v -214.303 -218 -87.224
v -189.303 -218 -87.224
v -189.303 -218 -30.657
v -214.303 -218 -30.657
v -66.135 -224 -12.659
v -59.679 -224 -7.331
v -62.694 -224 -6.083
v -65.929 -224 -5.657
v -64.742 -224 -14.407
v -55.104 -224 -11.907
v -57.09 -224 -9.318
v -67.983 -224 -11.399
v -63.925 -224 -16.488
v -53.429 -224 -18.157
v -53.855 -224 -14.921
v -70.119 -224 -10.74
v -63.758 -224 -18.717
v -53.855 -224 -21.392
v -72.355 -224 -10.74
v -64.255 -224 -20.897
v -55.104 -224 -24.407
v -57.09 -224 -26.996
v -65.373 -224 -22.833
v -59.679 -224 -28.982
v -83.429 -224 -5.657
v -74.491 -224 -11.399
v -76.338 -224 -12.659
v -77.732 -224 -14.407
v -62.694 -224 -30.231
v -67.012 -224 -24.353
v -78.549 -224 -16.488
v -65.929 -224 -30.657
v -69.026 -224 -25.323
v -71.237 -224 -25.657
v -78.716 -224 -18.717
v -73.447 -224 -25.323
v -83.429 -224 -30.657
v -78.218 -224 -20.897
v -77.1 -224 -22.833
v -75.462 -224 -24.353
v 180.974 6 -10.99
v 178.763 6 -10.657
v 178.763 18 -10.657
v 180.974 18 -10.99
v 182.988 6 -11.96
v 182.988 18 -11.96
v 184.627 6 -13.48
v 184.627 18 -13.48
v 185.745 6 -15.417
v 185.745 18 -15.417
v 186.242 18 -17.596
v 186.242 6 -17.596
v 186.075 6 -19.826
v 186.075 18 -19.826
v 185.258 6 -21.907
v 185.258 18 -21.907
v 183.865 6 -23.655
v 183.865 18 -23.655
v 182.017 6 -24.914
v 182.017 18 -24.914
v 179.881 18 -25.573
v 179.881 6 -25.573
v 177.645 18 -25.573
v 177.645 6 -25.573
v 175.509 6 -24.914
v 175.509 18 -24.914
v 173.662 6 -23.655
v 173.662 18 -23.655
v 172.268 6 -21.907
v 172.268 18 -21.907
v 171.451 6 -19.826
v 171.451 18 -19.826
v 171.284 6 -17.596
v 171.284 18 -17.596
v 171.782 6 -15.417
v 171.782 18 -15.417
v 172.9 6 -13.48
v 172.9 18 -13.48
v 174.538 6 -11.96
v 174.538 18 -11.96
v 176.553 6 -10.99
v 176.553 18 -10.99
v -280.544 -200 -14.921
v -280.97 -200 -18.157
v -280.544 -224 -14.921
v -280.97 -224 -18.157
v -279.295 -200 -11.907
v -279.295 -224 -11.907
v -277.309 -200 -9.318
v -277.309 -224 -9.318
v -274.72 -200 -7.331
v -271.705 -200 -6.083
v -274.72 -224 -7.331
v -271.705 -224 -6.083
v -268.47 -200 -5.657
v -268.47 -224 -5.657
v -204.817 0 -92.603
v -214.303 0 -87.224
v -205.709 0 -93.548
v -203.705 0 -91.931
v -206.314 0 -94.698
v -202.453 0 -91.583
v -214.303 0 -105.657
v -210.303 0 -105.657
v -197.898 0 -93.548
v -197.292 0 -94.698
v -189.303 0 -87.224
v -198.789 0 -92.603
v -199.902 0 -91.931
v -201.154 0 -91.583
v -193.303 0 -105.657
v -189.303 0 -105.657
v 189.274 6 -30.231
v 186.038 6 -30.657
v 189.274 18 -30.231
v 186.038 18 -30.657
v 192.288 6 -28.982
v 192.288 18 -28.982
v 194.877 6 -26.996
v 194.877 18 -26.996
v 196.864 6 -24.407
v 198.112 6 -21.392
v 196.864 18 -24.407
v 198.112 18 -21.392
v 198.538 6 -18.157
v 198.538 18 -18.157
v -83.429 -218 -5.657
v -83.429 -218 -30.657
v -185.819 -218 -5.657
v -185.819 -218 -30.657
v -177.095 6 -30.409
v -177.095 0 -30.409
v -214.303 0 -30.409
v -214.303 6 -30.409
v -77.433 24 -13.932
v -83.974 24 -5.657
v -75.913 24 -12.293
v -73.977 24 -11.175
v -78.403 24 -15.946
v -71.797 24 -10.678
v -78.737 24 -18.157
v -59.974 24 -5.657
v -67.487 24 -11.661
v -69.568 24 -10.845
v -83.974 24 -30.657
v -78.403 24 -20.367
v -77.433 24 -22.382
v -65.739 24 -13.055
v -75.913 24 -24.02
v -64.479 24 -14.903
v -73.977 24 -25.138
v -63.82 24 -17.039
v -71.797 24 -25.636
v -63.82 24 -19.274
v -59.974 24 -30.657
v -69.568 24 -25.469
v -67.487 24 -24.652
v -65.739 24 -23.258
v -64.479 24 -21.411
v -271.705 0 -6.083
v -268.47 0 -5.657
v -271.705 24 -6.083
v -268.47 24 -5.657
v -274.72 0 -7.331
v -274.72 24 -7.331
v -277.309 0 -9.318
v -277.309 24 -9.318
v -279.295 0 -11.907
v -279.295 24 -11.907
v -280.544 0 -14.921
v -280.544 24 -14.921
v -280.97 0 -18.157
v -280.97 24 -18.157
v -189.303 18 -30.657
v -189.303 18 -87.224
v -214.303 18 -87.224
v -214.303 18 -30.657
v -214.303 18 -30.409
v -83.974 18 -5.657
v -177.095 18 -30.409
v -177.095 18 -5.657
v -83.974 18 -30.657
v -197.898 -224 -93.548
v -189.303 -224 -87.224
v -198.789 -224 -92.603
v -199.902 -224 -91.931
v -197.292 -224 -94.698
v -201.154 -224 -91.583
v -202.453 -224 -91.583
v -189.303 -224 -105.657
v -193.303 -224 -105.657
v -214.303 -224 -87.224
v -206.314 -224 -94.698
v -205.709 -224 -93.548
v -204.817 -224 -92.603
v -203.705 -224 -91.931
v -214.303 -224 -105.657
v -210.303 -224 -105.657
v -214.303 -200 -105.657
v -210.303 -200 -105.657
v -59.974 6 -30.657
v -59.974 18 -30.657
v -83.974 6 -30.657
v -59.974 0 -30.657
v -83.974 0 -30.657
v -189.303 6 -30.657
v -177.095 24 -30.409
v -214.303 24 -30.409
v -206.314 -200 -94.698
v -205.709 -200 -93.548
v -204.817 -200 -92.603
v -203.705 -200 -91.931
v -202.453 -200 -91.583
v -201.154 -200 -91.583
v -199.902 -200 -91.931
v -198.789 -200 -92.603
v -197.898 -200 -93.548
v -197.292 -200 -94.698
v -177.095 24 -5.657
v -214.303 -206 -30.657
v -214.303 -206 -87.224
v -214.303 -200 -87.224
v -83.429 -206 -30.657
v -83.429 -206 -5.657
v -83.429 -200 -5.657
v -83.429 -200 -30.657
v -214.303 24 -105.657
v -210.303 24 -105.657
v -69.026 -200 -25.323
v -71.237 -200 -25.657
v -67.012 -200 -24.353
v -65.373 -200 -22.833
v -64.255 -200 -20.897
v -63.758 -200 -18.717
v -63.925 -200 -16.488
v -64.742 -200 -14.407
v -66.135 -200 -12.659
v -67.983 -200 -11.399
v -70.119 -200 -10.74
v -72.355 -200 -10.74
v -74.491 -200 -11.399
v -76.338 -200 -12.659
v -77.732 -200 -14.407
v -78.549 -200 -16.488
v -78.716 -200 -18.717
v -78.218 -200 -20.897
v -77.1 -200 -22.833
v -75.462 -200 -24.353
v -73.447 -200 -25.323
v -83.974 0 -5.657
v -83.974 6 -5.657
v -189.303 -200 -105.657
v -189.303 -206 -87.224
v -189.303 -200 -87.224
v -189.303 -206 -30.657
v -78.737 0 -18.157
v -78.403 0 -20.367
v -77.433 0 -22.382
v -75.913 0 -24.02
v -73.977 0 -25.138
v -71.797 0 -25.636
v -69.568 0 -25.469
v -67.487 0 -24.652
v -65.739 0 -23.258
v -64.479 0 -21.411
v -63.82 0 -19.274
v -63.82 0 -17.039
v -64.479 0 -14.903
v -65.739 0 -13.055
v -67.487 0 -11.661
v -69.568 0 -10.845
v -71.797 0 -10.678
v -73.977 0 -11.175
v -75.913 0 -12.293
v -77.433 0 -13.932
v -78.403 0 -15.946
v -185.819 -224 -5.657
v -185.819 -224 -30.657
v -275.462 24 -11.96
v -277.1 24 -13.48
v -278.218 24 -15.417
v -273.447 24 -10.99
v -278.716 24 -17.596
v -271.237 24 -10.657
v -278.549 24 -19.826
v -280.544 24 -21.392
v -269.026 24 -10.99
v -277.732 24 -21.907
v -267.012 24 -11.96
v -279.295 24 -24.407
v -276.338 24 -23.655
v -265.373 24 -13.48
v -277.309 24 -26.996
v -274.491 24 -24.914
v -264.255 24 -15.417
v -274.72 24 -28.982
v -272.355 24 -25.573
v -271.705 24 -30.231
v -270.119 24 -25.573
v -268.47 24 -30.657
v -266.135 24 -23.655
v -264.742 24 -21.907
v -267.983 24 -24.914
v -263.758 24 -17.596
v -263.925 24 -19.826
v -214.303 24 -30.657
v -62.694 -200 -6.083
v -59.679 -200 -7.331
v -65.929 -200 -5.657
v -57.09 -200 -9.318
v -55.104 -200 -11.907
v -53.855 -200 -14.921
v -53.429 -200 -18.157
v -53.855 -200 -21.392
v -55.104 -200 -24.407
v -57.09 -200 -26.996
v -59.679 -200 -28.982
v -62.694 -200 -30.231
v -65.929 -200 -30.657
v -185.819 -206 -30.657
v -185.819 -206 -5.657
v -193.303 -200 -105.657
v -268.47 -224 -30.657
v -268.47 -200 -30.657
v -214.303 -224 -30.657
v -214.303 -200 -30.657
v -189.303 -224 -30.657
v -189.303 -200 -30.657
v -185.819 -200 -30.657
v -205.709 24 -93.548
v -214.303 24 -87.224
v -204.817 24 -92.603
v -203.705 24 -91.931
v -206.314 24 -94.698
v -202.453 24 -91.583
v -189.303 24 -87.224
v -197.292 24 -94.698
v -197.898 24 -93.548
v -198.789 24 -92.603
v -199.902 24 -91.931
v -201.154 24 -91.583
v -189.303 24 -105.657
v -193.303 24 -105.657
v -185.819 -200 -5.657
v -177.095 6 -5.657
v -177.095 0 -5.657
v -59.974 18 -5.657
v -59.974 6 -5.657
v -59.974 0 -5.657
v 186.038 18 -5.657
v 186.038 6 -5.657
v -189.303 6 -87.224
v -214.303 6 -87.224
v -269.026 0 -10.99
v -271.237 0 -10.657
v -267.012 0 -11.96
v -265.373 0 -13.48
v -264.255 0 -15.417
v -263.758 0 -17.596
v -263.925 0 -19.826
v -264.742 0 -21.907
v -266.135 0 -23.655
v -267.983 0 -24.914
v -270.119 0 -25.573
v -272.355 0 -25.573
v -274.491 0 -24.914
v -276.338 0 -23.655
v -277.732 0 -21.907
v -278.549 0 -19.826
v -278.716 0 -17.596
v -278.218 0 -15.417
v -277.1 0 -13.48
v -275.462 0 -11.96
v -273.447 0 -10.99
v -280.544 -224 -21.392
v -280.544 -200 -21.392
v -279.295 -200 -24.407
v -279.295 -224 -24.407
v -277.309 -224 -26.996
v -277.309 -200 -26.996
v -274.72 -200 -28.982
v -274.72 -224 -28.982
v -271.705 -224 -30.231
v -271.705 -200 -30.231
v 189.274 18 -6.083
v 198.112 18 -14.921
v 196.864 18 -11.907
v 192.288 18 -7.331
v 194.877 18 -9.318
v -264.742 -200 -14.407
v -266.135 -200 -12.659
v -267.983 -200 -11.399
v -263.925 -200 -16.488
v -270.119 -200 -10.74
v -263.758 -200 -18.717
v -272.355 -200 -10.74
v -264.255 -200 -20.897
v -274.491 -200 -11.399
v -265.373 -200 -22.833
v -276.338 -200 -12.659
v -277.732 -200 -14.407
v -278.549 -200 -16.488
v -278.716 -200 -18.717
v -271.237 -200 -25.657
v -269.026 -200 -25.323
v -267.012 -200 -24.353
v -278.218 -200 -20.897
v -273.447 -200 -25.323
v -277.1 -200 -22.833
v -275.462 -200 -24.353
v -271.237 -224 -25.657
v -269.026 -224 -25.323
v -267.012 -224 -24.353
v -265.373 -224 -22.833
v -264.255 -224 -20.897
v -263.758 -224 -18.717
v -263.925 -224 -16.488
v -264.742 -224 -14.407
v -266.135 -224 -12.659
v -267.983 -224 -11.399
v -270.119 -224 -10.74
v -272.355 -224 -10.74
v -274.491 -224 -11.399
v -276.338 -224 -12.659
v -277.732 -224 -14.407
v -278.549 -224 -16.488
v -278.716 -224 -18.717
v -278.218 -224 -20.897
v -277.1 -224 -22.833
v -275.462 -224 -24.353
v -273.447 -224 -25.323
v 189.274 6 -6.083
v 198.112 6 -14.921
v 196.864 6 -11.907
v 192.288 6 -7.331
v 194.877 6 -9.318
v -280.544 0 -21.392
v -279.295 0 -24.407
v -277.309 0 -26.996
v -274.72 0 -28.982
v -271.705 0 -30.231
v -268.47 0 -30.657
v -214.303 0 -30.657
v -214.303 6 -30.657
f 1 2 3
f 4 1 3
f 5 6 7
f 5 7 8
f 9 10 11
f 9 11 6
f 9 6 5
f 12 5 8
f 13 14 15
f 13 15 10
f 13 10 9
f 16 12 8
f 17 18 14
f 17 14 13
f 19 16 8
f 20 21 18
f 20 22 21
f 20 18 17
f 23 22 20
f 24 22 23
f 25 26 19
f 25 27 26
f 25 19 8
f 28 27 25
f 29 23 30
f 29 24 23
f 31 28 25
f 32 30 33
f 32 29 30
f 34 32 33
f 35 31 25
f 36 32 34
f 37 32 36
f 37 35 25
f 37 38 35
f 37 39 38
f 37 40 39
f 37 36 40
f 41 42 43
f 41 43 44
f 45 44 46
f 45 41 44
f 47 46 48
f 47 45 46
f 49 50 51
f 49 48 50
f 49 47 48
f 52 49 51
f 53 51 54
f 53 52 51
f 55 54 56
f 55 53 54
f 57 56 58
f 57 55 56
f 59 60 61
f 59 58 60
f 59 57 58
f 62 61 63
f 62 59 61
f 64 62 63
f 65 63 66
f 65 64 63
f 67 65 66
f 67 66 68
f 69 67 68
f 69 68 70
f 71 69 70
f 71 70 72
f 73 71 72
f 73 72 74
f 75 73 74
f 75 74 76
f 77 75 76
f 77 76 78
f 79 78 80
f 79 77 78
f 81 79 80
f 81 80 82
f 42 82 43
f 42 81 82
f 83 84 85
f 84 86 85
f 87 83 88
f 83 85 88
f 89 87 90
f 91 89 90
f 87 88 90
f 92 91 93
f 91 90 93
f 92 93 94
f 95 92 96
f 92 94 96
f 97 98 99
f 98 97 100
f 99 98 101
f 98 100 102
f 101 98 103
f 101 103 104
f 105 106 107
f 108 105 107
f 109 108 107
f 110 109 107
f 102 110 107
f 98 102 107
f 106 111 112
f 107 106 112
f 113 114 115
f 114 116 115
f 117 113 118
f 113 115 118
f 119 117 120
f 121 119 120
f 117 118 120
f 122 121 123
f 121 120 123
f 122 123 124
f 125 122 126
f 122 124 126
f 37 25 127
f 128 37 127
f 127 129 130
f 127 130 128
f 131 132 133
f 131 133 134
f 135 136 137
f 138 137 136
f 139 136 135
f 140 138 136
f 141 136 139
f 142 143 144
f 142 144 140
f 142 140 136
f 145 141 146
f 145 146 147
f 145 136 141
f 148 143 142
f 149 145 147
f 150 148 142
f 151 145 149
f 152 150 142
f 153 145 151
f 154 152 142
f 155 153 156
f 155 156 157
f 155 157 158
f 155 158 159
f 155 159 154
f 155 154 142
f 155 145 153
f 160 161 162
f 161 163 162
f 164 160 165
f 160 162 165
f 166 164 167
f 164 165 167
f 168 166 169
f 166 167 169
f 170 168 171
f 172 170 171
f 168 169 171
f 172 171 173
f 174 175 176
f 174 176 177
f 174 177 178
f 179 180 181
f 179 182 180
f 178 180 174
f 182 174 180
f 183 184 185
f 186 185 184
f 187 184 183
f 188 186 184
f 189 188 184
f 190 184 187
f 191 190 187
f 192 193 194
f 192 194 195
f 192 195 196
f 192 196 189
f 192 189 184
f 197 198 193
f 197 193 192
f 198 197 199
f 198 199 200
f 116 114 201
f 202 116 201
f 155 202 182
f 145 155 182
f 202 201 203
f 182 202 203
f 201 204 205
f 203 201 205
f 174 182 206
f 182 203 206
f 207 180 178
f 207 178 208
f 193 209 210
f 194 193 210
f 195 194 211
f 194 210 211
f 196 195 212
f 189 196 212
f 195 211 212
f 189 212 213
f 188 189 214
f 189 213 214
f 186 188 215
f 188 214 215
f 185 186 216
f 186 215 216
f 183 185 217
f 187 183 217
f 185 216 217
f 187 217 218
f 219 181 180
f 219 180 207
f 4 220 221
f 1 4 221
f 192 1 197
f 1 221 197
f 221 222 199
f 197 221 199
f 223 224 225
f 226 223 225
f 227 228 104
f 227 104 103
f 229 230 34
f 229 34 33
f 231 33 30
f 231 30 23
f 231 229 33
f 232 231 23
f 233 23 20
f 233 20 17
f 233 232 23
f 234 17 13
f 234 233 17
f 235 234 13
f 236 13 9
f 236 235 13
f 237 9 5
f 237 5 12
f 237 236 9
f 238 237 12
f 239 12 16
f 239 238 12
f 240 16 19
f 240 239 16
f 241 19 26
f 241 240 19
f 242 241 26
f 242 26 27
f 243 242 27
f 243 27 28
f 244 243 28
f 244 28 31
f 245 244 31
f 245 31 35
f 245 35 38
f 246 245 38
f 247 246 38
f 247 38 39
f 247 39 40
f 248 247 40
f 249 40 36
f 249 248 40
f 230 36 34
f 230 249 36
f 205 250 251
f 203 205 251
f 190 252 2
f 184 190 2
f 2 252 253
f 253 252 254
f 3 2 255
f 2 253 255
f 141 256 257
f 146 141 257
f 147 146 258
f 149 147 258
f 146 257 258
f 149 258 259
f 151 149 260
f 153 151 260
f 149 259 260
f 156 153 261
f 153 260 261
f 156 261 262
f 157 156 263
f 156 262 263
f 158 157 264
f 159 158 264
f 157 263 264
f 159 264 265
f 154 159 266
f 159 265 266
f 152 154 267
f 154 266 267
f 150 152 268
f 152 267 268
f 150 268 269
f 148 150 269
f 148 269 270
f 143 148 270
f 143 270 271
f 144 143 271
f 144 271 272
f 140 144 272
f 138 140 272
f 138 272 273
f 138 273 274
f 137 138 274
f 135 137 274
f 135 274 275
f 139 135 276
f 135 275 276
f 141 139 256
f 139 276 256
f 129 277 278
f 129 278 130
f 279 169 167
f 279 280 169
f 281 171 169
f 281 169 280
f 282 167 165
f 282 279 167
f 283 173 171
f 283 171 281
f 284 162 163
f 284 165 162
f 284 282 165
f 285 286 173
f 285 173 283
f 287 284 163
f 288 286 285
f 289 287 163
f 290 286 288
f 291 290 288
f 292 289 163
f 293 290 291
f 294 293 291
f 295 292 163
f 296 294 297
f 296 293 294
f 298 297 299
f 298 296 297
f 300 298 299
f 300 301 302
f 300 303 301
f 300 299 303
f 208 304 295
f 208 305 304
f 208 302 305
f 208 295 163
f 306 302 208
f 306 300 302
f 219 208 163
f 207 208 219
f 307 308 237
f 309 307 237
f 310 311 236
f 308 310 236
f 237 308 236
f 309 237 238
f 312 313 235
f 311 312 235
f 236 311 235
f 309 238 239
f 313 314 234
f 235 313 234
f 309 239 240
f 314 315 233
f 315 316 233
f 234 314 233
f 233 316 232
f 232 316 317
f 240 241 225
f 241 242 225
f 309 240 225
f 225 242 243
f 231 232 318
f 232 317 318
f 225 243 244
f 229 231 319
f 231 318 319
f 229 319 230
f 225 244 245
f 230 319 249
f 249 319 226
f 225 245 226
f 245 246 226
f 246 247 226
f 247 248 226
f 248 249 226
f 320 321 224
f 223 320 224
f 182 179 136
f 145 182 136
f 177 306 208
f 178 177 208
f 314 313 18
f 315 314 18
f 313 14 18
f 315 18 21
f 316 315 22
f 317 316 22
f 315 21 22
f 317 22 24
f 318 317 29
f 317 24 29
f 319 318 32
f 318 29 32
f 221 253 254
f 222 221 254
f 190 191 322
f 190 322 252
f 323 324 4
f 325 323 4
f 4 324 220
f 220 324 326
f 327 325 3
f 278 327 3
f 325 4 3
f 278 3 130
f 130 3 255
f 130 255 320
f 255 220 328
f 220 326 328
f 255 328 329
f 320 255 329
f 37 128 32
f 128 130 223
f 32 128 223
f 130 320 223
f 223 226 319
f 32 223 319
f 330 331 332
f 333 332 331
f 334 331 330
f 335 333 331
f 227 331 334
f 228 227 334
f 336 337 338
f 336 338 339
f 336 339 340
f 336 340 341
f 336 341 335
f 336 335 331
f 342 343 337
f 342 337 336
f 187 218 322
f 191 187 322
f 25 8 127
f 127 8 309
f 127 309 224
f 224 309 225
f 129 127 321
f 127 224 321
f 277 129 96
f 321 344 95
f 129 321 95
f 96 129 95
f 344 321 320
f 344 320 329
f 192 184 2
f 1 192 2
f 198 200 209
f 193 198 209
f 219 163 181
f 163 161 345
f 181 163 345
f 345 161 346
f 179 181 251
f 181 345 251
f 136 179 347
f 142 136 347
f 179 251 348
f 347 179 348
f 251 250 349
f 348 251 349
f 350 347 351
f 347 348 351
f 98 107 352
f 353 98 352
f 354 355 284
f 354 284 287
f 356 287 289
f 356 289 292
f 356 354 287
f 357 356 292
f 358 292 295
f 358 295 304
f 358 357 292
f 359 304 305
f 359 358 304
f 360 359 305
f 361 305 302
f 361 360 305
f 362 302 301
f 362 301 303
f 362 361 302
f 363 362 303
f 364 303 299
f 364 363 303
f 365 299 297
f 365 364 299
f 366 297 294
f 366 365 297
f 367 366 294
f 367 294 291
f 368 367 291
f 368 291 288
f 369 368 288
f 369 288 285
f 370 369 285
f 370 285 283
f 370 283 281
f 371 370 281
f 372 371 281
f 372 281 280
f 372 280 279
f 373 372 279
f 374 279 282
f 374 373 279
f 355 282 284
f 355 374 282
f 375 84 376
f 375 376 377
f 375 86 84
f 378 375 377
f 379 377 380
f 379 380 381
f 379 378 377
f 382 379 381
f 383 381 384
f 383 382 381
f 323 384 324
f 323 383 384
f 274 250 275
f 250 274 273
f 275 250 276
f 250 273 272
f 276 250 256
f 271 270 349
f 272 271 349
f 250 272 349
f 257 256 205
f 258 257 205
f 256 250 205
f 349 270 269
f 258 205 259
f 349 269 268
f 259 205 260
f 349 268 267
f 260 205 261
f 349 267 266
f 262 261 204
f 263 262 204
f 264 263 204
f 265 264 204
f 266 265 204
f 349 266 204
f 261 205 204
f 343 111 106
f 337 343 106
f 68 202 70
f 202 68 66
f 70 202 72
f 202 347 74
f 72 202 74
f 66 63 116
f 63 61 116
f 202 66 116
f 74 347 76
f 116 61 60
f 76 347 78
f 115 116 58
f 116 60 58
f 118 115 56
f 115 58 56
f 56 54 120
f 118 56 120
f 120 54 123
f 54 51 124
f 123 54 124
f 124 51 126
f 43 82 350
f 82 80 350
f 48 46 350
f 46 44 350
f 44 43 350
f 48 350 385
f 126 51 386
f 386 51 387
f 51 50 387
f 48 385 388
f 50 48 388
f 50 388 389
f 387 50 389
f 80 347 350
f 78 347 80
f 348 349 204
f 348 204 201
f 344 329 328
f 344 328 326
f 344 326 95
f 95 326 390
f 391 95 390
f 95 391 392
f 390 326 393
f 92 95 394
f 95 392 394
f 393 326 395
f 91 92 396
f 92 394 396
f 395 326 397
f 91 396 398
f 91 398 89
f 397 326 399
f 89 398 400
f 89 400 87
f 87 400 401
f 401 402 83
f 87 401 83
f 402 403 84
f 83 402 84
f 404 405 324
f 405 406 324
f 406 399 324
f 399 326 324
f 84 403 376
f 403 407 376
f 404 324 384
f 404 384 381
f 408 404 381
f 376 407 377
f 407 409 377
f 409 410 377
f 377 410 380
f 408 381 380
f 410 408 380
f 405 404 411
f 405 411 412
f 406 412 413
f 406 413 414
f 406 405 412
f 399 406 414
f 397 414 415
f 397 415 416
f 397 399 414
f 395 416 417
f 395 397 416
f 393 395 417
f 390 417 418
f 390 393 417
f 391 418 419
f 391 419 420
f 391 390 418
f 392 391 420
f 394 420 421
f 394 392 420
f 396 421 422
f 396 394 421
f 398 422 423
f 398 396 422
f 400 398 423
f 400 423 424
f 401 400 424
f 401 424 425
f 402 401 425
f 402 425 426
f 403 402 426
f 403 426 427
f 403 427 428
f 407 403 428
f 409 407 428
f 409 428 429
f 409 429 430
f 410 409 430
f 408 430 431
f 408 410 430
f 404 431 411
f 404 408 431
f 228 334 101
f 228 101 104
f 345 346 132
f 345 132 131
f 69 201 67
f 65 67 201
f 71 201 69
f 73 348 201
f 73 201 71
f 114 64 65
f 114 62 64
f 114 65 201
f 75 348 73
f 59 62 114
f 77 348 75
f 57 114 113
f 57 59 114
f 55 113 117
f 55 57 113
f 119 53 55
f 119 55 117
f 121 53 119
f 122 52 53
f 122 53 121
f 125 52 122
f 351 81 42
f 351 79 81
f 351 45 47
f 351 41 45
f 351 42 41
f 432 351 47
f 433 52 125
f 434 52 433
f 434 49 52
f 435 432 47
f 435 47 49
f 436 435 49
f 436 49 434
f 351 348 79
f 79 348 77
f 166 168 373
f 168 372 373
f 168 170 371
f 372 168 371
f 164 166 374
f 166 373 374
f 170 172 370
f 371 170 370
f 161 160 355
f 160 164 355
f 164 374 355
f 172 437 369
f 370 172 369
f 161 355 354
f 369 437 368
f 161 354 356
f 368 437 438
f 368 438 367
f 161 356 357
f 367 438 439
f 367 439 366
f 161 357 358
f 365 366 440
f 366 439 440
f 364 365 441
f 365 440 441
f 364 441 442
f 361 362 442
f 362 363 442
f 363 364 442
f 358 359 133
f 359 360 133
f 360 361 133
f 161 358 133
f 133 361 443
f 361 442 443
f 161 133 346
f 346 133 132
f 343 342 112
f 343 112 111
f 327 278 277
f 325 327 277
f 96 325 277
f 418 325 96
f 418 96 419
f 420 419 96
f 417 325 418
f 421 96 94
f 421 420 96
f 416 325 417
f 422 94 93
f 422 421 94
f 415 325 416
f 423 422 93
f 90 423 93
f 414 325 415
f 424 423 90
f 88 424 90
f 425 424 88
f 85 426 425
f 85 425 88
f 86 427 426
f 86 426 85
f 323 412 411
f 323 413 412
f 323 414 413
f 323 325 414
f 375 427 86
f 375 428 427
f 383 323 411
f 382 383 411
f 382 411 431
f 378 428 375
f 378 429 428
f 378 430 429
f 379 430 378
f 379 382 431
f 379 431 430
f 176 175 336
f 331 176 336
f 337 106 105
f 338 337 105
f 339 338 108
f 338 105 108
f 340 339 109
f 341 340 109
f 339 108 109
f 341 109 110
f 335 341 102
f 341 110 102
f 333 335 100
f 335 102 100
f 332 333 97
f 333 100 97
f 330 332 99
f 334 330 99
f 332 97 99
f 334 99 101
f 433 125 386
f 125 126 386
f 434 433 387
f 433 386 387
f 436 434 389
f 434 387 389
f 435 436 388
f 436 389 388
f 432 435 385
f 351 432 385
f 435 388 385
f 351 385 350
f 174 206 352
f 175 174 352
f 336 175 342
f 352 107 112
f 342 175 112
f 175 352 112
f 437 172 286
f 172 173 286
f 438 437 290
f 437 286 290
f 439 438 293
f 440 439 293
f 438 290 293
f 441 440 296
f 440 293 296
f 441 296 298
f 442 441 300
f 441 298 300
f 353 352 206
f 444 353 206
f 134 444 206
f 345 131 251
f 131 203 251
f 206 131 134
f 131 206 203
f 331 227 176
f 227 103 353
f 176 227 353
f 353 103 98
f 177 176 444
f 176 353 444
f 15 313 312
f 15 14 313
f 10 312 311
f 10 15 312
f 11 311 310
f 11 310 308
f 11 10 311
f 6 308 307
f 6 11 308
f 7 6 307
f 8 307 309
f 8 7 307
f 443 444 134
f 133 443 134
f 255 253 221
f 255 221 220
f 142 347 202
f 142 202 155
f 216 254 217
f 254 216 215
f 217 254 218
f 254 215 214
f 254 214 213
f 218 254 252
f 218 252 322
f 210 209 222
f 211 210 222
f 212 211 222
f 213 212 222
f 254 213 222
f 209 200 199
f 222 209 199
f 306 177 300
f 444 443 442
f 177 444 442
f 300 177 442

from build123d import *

# Parameters (mm, degrees)
SKETCH1_R                = 7.5
BOSS_EXTRUDE1_DEPTH      = 24
SKETCH7_R                = 7.5
BOSS_EXTRUDE2_DEPTH      = 24
SKETCH9_W                = 267.304996702
SKETCH9_H                = 6
SKETCH9_W_2              = 93.120375714
CUT_EXTRUDE2_DEPTH       = 25
SKETCH10_W               = 102.39026263
SKETCH10_H               = 6
CUT_EXTRUDE6_DEPTH       = 40
CUT_EXTRUDE7_START       = -37.208675348
CUT_EXTRUDE7_OUTLINE_W   = 56.567816269
CUT_EXTRUDE7_OUTLINE_H   = 6
CUT_EXTRUDE7_OUTLINE_W_2 = 56.815074254
CUT_EXTRUDE7_DEPTH       = 37.208675348
FILLET1_R                = 12.5
FILLET2_R                = 12.5


# Read off the part's stored shape, not the designer's step: Cut-Extrude7
with BuildPart() as part:
    # Sketch1 → Boss-Extrude1 (new body)
    with BuildSketch(Plane(origin=(0, 0, 0), x_dir=(1, 0, 0), z_dir=(0, 1, 0))):
        with BuildLine():
            Line((-206.314451257, 94.69754914), (-210.303240713, 105.656658099))
            Line((-210.303240713, 105.656658099), (-214.303240713, 105.656658099))
            Line((-214.303240713, 105.656658099), (-214.303240713, 30.656658099))
            Line((-214.303240713, 30.656658099), (-280.969907379, 30.656658099))
            Line((-280.969907379, 30.656658099), (-280.969907379, 5.656658099))
            Line((-280.969907379, 5.656658099), (198.538356926, 5.656658099))
            Line((198.538356926, 5.656658099), (198.538356926, 30.656658099))
            Line((198.538356926, 30.656658099), (-189.303240713, 30.656658099))
            Line((-189.303240713, 30.656658099), (-189.303240713, 105.656658099))
            Line((-189.303240713, 105.656658099), (-193.303240713, 105.656658099))
            Line((-193.303240713, 105.656658099), (-197.292030168, 94.69754914))
            ThreePointArc((-197.292030168, 94.69754914), (-201.803240713, 91.53876551), (-206.314451257, 94.69754914))
        make_face()
        with Locations(Location((-271.236698838, 18.156658099, 0), (0, 0, 270))):
            Circle(SKETCH1_R, mode=Mode.SUBTRACT)
        with BuildLine():
            ThreePointArc((-63.736698838, 18.156658099), (-71.236698838, 10.656658099), (-78.736698838, 18.156658099))
            ThreePointArc((-78.736698838, 18.156658099), (-71.236698838, 25.656658099), (-63.736698838, 18.156658099))
        make_face(mode=Mode.SUBTRACT)
        with Locations(Location((178.763301162, 18.156658099, 0), (0, 0, 270))):
            Circle(SKETCH1_R, mode=Mode.SUBTRACT)
    extrude(amount=BOSS_EXTRUDE1_DEPTH)

    # Sketch9 → Cut-Extrude2 (cut)
    with BuildSketch(Plane.XY.offset(-5.656658099)):
        with Locations((73.678308701, 21)):
            Rectangle(SKETCH9_W, SKETCH9_H)
        with Locations((73.678308701, 3)):
            Rectangle(SKETCH9_W, SKETCH9_H)
        with Locations((-130.534377507, 21)):
            Rectangle(SKETCH9_W_2, SKETCH9_H)
        with Locations((-130.534377507, 3)):
            Rectangle(SKETCH9_W_2, SKETCH9_H)
    extrude(amount=-CUT_EXTRUDE2_DEPTH, mode=Mode.SUBTRACT)


with BuildPart() as body_2:
    # Sketch7 → Boss-Extrude2 (new body)
    with BuildSketch(Plane(origin=(0, -200, 0), x_dir=(-1, 0, 0), z_dir=(0, -1, 0))):
        with BuildLine():
            Line((53.429067072, 30.656658099), (53.429067072, 5.656658099))
            Line((53.429067072, 5.656658099), (280.969907379, 5.656658099))
            Line((280.969907379, 5.656658099), (280.969907379, 30.656658099))
            Line((280.969907379, 30.656658099), (214.303240713, 30.656658099))
            Line((214.303240713, 30.656658099), (214.303240713, 105.656658099))
            Line((214.303240713, 105.656658099), (210.303240713, 105.656658099))
            Line((210.303240713, 105.656658099), (206.314451257, 94.69754914))
            ThreePointArc((206.314451257, 94.69754914), (201.803240713, 91.53876551), (197.292030168, 94.69754914))
            Line((197.292030168, 94.69754914), (193.303240713, 105.656658099))
            Line((193.303240713, 105.656658099), (189.303240713, 105.656658099))
            Line((189.303240713, 105.656658099), (189.303240713, 30.656658099))
            Line((189.303240713, 30.656658099), (53.429067072, 30.656658099))
        make_face()
        with Locations(Location((271.236698838, 18.156658099, 0), (0, 0, 90))):
            Circle(SKETCH7_R, mode=Mode.SUBTRACT)
        with Locations(Location((71.236698838, 18.156658099, 0), (0, 0, 90))):
            Circle(SKETCH7_R, mode=Mode.SUBTRACT)
    extrude(amount=BOSS_EXTRUDE2_DEPTH)

    # Sketch10 → Cut-Extrude6 (cut)
    with BuildSketch(Plane.XY.offset(-5.656658099)):
        with Locations((-134.624198387, -203)):
            Rectangle(SKETCH10_W, SKETCH10_H)
        with Locations((-134.624198387, -221)):
            Rectangle(SKETCH10_W, SKETCH10_H)
    extrude(amount=-CUT_EXTRUDE6_DEPTH, mode=Mode.SUBTRACT)


with BuildPart() as cut_extrude7_tool:
    # Cut-Extrude7 outline → Cut-Extrude7 (new body)
    with BuildSketch(Plane.ZY.offset(214.303240713).offset(CUT_EXTRUDE7_START)):
        with Locations((-58.940566234, -221)):
            Rectangle(CUT_EXTRUDE7_OUTLINE_W, CUT_EXTRUDE7_OUTLINE_H)
        with Locations((-58.940566234, -203)):
            Rectangle(CUT_EXTRUDE7_OUTLINE_W, CUT_EXTRUDE7_OUTLINE_H)
        with Locations((-58.816937241, 21)):
            Rectangle(CUT_EXTRUDE7_OUTLINE_W_2, CUT_EXTRUDE7_OUTLINE_H)
        with Locations((-58.816937241, 3)):
            Rectangle(CUT_EXTRUDE7_OUTLINE_W_2, CUT_EXTRUDE7_OUTLINE_H)
    extrude(amount=CUT_EXTRUDE7_DEPTH)


with BuildPart() as part_1:
    add(part.part)

    # Cut-Extrude7: cut by cut_extrude7_tool
    add(cut_extrude7_tool.part, mode=Mode.SUBTRACT)

    # Fillet1
    fillet1_edges = [part_1.edges().sort_by_distance(p)[0] for p in [
        (-280.969907379, 12, -5.656658099),
        (-280.969907379, 12, -30.656658099),
        (198.538356926, 12, -5.656658099),
        (198.538356926, 12, -30.656658099),
    ]]
    fillet(fillet1_edges, radius=FILLET1_R - 0.0001)  # a hair under: the kernel refuses the full size


with BuildPart() as body_2_1:
    add(body_2.part)

    # Cut-Extrude7: cut by cut_extrude7_tool
    add(cut_extrude7_tool.part, mode=Mode.SUBTRACT)

    # Fillet2
    fillet2_edges = [body_2_1.edges().sort_by_distance(p)[0] for p in [
        (-53.429067072, -212, -5.656658099),
        (-53.429067072, -212, -30.656658099),
        (-280.969907379, -212, -5.656658099),
        (-280.969907379, -212, -30.656658099),
    ]]
    fillet(fillet2_edges, radius=FILLET2_R - 0.0001)  # a hair under: the kernel refuses the full size


solid = Compound([part_1.part, body_2_1.part])
